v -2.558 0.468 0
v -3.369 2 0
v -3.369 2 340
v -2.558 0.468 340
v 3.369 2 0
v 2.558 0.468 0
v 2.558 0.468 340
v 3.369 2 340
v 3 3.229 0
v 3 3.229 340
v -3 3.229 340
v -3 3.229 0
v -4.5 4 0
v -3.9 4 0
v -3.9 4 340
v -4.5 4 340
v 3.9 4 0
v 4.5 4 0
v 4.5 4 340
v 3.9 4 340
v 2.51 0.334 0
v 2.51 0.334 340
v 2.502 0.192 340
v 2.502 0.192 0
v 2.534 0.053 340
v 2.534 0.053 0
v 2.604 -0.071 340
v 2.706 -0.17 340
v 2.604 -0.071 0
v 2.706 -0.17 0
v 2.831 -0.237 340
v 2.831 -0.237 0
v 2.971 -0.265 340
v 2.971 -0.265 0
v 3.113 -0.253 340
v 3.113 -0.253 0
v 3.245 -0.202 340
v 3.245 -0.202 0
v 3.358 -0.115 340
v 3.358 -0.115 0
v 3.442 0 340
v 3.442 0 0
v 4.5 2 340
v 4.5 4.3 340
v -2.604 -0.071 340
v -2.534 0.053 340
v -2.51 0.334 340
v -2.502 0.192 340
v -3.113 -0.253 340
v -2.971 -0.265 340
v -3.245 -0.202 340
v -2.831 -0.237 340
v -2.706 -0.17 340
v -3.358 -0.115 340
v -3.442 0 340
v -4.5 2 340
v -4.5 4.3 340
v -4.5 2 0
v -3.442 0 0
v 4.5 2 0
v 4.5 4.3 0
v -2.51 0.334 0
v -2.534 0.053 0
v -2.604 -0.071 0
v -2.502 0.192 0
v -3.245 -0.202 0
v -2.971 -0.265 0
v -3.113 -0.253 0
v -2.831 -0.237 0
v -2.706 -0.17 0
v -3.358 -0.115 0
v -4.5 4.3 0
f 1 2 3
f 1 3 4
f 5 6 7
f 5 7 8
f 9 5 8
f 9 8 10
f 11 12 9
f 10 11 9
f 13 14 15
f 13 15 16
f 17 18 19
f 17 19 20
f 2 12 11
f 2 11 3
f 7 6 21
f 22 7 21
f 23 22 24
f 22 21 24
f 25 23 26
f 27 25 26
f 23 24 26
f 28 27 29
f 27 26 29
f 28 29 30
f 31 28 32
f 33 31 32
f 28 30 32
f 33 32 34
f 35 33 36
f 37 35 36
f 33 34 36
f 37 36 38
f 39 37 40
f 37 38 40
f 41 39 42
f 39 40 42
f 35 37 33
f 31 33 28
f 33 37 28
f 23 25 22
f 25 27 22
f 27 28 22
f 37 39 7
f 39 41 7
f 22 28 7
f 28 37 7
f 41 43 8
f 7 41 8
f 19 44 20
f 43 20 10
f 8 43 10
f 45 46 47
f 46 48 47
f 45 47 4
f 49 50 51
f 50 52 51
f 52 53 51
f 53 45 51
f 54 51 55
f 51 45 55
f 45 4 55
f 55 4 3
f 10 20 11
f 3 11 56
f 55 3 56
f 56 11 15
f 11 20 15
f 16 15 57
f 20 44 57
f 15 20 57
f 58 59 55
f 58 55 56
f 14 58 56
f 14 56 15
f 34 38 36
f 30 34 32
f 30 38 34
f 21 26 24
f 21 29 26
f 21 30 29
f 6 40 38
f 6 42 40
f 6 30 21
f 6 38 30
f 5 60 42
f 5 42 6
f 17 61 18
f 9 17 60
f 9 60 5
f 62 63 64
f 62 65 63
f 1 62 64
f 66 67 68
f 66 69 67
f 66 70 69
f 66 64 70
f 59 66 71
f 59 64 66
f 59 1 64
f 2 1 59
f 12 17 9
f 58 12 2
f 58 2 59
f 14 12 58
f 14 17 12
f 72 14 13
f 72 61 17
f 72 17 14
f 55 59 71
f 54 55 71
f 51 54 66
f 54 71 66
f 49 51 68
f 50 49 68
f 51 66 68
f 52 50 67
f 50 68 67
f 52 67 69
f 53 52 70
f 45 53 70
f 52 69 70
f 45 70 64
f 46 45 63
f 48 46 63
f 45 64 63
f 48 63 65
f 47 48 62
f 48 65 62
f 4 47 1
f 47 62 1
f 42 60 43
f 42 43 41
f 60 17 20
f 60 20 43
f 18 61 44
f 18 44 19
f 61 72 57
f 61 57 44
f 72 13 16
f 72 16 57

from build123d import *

# Parameters (mm, degrees)
PAD_DEPTH = 340


with BuildPart() as part:
    # Sketch → Pad (new body)
    with BuildSketch(Plane.XY):
        with BuildLine():
            Line((-4.5, 4.3), (4.5, 4.3))
            Line((4.5, 4.3), (4.5, 4))
            Line((4.5, 4), (3.9, 4))
            Line((3.9, 4), (4.5, 2))
            Line((4.5, 2), (3.441966, 0))
            ThreePointArc((2.558034, 0.467615), (2.766192, -0.208159), (3.441966, 0))
            Line((2.558034, 0.467615), (3.368691, 2))
            Line((3.368691, 2), (3, 3.228972))
            Line((-3, 3.228972), (3, 3.228972))
            Line((-3, 3.228972), (-3.368691, 2))
            Line((-3.368691, 2), (-2.558034, 0.467615))
            ThreePointArc((-3.441966, 0), (-2.766192, -0.208159), (-2.558034, 0.467615))
            Line((-3.441966, 0), (-4.5, 2))
            Line((-4.5, 2), (-3.9, 4))
            Line((-3.9, 4), (-4.5, 4))
            Line((-4.5, 4), (-4.5, 4.3))
        make_face()
    extrude(amount=PAD_DEPTH)


solid = part.part
